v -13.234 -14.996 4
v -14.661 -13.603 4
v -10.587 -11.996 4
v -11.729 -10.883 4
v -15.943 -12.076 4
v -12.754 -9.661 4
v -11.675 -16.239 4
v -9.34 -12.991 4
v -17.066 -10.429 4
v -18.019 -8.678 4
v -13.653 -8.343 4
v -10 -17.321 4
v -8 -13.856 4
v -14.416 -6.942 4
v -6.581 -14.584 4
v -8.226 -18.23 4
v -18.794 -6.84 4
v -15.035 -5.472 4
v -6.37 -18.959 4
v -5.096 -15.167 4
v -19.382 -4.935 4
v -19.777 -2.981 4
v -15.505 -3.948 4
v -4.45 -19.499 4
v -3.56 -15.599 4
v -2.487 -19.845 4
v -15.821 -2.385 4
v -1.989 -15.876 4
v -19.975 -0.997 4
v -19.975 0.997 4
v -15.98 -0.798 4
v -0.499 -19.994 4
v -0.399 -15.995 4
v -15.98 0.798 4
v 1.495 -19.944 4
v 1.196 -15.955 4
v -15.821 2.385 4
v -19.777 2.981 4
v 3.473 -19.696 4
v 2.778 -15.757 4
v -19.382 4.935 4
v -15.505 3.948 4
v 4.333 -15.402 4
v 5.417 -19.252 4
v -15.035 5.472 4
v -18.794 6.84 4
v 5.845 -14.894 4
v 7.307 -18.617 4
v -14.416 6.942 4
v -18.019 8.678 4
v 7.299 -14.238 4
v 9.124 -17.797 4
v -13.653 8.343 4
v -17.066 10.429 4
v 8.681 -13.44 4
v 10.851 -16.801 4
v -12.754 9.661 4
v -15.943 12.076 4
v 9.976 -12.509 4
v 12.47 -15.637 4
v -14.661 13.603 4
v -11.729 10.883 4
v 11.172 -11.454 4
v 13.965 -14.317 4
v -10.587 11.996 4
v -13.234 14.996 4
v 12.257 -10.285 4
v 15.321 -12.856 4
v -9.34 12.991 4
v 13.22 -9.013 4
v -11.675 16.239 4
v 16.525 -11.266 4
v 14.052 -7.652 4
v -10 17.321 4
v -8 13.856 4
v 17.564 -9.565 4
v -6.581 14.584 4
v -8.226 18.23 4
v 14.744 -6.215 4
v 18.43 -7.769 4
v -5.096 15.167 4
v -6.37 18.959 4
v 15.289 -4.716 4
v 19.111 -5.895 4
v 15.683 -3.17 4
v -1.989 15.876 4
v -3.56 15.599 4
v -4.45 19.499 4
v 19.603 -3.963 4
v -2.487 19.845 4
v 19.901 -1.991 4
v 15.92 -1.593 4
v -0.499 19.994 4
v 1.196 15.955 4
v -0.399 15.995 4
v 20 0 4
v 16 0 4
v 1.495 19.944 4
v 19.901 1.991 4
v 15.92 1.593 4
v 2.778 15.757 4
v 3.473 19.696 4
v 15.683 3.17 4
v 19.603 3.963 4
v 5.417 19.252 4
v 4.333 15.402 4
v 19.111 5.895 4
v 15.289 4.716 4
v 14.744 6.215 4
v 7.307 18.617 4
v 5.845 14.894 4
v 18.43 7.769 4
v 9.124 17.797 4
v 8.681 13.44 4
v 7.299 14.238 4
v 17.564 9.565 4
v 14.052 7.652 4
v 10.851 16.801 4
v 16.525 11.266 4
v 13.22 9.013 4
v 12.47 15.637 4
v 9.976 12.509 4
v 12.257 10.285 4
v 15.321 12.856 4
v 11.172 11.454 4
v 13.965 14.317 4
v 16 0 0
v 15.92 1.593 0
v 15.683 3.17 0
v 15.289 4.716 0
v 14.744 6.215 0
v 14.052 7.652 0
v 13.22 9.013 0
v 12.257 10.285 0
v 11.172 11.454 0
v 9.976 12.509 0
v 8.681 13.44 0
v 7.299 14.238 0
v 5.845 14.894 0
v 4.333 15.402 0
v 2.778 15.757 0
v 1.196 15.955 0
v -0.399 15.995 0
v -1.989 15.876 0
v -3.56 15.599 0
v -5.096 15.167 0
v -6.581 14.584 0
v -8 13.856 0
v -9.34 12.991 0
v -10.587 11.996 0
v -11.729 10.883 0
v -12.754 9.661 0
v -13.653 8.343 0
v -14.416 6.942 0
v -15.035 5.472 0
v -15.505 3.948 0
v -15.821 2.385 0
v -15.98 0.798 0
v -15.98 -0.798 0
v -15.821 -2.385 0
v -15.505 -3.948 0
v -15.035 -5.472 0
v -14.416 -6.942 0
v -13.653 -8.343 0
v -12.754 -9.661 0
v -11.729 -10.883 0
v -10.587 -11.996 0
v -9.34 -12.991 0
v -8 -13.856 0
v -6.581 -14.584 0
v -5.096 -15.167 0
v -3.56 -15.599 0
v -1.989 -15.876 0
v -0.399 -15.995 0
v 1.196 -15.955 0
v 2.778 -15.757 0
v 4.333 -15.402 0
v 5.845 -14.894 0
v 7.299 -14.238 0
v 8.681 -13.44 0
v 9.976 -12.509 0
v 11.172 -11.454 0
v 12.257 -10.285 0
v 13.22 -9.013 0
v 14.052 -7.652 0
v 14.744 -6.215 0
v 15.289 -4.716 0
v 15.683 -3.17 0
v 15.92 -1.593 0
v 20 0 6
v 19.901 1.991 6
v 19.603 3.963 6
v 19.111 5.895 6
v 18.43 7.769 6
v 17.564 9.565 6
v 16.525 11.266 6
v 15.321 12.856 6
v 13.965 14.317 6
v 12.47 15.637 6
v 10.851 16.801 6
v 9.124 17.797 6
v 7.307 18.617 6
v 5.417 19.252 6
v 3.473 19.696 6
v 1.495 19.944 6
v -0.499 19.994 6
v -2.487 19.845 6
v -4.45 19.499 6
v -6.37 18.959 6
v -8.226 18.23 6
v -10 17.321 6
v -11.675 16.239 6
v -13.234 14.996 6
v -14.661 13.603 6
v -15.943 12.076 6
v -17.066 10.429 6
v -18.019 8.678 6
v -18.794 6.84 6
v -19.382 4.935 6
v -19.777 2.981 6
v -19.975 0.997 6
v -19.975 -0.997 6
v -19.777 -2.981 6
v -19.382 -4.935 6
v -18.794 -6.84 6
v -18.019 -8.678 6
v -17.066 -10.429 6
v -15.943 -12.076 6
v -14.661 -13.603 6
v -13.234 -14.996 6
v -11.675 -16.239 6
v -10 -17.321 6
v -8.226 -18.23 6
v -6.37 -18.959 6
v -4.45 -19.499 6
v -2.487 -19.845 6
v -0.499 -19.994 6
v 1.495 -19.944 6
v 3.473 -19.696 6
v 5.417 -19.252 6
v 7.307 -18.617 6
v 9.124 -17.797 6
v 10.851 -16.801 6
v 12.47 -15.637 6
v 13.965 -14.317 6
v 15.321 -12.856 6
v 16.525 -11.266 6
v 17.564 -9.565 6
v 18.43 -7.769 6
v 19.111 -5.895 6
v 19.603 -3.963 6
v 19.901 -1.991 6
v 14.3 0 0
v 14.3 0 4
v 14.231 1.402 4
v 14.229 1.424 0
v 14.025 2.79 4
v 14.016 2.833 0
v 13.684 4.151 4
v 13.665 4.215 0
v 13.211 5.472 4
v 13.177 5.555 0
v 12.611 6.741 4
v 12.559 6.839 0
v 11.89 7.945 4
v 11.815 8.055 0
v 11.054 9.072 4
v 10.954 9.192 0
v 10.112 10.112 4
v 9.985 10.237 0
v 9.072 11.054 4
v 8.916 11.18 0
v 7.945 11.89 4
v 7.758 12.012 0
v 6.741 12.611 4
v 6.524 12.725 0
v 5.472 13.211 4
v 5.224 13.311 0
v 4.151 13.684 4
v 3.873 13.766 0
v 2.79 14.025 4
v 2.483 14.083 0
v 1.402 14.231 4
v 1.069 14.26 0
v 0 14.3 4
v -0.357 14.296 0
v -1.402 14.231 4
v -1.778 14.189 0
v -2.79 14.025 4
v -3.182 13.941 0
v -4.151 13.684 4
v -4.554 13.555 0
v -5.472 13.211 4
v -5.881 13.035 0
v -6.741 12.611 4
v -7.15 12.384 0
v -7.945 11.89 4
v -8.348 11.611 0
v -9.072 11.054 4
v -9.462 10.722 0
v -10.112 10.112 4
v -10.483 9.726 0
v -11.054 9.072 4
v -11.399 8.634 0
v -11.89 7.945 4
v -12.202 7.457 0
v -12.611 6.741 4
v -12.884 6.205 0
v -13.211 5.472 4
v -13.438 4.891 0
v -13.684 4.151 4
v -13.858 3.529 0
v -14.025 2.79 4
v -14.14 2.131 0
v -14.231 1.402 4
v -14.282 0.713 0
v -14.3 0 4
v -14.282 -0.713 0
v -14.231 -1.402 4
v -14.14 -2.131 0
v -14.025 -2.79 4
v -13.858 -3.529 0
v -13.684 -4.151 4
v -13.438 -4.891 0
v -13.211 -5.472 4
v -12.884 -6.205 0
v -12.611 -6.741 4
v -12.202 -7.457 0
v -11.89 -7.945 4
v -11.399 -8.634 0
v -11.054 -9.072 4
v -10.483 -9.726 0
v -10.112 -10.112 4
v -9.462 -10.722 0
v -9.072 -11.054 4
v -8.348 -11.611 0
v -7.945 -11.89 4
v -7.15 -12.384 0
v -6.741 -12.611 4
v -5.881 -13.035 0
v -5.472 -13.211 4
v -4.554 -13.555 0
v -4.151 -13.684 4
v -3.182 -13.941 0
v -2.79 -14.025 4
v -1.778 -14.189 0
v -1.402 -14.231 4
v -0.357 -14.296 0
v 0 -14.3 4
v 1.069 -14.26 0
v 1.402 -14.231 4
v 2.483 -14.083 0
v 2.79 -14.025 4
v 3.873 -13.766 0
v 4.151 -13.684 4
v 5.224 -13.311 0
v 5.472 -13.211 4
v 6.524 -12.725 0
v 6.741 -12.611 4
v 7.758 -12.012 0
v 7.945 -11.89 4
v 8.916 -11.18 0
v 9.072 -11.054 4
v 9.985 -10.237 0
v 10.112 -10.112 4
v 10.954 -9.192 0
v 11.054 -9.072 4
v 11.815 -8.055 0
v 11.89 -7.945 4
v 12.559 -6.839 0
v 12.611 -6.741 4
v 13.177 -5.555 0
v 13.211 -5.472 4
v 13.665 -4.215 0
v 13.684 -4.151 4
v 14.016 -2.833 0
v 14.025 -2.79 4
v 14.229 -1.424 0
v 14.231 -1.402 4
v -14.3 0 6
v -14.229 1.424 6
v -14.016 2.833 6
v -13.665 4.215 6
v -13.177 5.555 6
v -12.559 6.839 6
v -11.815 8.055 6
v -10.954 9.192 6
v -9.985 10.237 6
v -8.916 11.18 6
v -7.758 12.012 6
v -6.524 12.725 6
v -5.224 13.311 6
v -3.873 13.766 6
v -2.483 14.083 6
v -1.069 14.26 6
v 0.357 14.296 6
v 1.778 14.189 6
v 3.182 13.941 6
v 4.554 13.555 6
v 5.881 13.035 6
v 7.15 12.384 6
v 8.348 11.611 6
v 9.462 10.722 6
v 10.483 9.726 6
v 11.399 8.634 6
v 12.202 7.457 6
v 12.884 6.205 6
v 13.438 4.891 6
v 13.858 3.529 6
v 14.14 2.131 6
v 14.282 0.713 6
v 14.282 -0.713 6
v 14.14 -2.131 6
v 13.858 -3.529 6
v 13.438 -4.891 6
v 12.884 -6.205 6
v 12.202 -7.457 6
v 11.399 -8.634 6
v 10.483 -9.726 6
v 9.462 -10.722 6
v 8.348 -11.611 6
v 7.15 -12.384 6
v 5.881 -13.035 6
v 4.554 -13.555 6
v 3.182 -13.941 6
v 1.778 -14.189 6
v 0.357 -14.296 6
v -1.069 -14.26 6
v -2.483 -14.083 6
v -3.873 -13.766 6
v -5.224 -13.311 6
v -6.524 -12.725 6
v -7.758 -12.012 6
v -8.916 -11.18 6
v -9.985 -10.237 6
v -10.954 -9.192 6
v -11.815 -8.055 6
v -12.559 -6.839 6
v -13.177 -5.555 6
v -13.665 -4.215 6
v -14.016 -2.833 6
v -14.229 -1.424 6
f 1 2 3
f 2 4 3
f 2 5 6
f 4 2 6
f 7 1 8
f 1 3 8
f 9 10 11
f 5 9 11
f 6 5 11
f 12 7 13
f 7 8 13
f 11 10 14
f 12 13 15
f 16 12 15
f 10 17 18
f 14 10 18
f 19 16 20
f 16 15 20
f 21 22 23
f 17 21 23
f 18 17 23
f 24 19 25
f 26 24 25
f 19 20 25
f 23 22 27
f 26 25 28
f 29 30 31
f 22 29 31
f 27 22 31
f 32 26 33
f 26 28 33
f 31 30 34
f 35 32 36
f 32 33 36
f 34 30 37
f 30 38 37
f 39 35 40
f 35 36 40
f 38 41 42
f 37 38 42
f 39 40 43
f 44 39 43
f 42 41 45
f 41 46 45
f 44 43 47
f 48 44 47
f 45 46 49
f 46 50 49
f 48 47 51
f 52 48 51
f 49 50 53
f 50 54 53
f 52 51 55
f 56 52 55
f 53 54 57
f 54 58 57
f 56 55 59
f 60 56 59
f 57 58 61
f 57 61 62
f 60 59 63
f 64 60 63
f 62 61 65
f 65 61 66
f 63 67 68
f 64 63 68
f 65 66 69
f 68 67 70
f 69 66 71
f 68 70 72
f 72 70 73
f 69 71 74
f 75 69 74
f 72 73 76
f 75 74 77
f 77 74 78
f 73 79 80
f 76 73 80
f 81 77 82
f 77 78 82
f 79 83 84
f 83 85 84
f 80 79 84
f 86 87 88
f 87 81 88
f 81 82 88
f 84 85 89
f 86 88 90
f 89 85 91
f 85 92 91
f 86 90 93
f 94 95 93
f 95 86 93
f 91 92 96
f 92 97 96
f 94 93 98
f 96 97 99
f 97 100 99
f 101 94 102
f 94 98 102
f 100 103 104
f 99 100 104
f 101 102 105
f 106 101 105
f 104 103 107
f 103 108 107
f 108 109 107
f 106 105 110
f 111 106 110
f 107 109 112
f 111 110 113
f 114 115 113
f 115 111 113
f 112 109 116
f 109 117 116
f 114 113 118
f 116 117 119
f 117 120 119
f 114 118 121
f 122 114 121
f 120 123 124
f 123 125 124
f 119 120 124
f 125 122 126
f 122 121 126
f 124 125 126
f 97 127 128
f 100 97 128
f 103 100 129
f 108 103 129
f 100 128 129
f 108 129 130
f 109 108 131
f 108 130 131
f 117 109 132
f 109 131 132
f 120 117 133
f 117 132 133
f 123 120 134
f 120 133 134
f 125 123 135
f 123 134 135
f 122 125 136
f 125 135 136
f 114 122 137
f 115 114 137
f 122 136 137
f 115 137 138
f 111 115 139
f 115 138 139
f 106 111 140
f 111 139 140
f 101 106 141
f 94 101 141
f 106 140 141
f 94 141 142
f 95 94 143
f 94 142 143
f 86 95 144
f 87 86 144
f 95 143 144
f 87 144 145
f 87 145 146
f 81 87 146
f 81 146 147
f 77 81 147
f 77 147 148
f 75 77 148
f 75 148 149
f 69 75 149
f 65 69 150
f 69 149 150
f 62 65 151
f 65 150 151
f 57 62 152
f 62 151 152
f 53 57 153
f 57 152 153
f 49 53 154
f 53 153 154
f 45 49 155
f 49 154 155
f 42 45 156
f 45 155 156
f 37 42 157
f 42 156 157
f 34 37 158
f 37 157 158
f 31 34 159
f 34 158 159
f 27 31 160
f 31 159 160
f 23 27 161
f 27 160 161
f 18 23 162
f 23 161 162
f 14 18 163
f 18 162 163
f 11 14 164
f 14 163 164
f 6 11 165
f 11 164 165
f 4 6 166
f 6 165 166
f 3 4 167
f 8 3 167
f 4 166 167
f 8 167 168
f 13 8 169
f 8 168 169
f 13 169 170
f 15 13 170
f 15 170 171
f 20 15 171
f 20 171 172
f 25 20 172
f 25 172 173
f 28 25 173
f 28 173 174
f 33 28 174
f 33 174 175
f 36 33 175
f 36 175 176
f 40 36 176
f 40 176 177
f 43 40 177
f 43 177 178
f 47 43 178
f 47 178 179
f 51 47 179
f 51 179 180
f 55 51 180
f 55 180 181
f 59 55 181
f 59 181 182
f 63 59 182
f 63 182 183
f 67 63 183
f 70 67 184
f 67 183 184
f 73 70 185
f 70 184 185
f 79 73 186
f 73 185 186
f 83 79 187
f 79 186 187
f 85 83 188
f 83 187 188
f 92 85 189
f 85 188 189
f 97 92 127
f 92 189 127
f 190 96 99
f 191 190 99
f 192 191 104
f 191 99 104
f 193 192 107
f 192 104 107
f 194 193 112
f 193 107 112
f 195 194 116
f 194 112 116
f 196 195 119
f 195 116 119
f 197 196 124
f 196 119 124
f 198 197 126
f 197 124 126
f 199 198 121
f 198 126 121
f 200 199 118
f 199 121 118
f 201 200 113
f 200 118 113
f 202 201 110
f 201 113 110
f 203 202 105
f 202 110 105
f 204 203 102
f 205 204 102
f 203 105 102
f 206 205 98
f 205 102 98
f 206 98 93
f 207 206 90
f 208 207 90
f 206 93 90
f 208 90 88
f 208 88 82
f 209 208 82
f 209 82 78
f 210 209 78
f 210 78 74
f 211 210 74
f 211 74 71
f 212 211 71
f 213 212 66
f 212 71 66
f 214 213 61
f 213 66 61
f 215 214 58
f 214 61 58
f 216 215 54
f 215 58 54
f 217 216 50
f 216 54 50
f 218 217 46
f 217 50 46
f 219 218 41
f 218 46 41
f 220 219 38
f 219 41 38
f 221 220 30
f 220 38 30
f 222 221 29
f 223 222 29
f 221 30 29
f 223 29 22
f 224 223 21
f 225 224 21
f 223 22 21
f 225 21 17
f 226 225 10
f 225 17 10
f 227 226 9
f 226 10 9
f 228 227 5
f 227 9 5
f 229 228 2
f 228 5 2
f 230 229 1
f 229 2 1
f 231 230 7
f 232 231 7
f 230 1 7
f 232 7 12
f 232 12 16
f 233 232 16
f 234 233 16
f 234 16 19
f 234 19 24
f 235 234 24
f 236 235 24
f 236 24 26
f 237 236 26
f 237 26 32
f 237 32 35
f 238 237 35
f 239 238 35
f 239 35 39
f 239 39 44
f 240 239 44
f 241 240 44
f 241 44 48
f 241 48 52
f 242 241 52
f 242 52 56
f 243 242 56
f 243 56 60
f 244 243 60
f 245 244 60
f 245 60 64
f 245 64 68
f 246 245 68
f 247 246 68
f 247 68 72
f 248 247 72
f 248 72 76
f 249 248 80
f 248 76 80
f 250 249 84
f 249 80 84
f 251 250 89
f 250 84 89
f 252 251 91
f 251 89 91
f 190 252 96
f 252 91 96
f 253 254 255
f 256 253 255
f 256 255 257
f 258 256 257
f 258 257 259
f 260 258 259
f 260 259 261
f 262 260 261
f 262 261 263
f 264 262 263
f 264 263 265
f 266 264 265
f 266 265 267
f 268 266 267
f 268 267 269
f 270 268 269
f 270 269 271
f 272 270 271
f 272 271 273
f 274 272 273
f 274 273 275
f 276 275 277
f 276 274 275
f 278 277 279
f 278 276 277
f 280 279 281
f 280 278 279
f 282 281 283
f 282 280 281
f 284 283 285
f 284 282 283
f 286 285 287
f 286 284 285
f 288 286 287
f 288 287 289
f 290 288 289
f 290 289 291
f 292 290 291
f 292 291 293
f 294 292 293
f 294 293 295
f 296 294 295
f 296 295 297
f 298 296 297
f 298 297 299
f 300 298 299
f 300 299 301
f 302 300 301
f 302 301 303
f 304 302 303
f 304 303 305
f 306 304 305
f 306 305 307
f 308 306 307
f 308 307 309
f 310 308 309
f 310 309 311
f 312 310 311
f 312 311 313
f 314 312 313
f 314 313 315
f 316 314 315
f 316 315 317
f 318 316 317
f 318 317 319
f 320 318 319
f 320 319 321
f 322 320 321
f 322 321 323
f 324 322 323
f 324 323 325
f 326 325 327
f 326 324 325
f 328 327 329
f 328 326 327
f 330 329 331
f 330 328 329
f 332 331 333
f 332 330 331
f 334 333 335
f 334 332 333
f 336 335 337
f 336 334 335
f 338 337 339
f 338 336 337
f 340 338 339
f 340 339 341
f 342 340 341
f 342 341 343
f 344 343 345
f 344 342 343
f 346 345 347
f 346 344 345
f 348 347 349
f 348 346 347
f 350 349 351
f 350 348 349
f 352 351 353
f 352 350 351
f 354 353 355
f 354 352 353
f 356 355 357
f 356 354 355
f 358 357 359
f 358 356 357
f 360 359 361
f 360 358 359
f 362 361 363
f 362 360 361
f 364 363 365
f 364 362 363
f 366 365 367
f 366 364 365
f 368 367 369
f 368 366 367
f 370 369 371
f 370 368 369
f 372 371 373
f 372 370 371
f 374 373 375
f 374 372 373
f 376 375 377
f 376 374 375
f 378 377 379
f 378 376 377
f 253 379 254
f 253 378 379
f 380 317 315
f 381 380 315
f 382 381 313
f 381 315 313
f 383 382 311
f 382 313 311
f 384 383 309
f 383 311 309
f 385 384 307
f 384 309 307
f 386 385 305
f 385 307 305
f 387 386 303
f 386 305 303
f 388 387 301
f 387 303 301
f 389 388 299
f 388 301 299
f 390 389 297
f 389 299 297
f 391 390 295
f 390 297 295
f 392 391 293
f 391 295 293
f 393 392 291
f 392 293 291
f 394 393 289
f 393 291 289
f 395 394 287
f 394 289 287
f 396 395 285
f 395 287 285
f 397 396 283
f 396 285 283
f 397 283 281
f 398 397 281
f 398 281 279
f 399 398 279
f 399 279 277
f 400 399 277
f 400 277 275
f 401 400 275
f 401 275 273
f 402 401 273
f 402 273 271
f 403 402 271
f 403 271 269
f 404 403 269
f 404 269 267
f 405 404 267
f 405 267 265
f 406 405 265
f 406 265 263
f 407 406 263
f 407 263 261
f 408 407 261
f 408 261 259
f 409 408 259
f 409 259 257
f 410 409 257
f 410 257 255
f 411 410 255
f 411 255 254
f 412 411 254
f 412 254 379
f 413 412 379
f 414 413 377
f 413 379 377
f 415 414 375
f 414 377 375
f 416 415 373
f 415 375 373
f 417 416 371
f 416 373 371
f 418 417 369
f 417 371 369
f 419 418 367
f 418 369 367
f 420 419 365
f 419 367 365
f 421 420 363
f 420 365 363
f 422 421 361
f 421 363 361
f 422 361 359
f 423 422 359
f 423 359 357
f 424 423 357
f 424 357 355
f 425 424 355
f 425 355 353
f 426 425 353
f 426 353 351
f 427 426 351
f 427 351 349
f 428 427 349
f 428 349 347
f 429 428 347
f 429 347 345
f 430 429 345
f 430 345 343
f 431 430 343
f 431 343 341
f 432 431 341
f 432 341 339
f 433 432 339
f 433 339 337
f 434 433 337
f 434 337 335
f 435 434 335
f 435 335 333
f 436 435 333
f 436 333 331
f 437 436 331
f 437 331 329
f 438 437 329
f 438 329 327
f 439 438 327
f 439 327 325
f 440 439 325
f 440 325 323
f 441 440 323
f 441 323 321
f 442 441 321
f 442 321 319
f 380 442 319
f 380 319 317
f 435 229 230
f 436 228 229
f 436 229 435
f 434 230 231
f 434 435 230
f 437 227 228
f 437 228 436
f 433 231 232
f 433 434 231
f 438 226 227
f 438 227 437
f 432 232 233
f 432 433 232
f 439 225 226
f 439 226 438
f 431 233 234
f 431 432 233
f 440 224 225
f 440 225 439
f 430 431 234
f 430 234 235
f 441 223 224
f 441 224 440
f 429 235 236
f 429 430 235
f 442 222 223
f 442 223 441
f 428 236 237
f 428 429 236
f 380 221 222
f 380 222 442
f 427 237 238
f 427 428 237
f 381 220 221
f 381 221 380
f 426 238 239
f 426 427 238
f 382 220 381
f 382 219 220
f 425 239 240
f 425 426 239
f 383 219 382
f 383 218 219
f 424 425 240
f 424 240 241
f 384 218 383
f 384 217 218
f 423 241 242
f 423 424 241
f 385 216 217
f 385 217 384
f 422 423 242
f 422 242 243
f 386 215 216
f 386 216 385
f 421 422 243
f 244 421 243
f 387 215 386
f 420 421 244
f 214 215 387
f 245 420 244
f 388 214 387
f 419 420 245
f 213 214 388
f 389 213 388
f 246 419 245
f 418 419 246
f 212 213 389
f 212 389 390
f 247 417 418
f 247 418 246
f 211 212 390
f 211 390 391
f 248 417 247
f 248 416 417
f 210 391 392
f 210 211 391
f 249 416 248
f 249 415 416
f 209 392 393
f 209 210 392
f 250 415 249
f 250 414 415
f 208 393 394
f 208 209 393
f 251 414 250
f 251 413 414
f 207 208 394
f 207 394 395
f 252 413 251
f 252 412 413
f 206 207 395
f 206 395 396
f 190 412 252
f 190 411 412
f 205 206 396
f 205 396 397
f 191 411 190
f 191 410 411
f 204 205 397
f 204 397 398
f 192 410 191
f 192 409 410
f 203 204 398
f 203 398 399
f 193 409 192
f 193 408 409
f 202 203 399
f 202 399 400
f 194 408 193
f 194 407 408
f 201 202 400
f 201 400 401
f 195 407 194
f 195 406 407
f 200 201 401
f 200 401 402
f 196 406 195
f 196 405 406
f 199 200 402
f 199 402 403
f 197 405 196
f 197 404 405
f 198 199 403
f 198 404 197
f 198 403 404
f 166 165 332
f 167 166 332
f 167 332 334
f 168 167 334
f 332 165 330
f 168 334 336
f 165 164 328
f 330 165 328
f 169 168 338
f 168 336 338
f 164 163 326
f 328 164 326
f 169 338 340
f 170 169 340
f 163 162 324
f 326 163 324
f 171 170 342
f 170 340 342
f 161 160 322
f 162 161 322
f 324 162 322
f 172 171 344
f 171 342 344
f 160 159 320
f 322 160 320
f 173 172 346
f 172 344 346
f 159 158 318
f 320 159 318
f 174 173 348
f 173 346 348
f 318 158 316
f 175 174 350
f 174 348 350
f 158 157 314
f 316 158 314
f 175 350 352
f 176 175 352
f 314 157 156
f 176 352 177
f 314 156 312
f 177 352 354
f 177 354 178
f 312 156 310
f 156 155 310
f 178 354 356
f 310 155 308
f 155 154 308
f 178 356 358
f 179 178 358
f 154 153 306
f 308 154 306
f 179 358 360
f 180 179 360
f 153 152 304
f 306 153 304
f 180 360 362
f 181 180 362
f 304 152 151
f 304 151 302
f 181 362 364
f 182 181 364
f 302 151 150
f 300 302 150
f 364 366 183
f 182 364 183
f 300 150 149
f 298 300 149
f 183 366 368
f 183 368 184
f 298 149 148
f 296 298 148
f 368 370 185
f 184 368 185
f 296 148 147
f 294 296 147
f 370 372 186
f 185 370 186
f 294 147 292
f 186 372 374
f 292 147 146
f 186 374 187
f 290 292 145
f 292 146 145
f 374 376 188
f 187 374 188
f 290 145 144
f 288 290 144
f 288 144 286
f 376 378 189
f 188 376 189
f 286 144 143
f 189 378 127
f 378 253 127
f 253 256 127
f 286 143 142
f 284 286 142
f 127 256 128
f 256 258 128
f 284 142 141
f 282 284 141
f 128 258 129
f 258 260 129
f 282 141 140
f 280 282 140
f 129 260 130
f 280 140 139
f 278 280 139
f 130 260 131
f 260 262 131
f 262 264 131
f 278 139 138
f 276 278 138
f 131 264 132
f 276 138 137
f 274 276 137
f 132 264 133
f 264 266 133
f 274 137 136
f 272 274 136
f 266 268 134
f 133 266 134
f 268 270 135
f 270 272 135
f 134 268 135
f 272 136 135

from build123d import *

# Parameters (mm, degrees)
SKETCH_1_R          = 16
SKETCH_1_R_2        = 14.3
EXTRUDE_1_DEPTH     = 4
SKETCH_2_R          = 20
EXTRUDE_2_DEPTH     = 2
SKETCH_3_R          = 14.3
CUT_EXTRUDE_1_DEPTH = 2


with BuildPart() as part:
    # 草图1 → 凸台-拉伸1 (new body)
    with BuildSketch(Plane.XY):
        Circle(SKETCH_1_R)
        Circle(SKETCH_1_R_2, mode=Mode.SUBTRACT)
    extrude(amount=EXTRUDE_1_DEPTH)

    # 草图2 → 凸台-拉伸2 (add)
    with BuildSketch(Plane.XY.offset(4)):
        Circle(SKETCH_2_R)
    extrude(amount=EXTRUDE_2_DEPTH)

    # 草图3 → 切除-拉伸1 (cut)
    with BuildSketch(Plane(origin=(0, 0, 4), x_dir=(-1, 0, 0), z_dir=(0, 0, -1))):
        Circle(SKETCH_3_R)
    extrude(amount=-CUT_EXTRUDE_1_DEPTH, mode=Mode.SUBTRACT)


solid = part.part
